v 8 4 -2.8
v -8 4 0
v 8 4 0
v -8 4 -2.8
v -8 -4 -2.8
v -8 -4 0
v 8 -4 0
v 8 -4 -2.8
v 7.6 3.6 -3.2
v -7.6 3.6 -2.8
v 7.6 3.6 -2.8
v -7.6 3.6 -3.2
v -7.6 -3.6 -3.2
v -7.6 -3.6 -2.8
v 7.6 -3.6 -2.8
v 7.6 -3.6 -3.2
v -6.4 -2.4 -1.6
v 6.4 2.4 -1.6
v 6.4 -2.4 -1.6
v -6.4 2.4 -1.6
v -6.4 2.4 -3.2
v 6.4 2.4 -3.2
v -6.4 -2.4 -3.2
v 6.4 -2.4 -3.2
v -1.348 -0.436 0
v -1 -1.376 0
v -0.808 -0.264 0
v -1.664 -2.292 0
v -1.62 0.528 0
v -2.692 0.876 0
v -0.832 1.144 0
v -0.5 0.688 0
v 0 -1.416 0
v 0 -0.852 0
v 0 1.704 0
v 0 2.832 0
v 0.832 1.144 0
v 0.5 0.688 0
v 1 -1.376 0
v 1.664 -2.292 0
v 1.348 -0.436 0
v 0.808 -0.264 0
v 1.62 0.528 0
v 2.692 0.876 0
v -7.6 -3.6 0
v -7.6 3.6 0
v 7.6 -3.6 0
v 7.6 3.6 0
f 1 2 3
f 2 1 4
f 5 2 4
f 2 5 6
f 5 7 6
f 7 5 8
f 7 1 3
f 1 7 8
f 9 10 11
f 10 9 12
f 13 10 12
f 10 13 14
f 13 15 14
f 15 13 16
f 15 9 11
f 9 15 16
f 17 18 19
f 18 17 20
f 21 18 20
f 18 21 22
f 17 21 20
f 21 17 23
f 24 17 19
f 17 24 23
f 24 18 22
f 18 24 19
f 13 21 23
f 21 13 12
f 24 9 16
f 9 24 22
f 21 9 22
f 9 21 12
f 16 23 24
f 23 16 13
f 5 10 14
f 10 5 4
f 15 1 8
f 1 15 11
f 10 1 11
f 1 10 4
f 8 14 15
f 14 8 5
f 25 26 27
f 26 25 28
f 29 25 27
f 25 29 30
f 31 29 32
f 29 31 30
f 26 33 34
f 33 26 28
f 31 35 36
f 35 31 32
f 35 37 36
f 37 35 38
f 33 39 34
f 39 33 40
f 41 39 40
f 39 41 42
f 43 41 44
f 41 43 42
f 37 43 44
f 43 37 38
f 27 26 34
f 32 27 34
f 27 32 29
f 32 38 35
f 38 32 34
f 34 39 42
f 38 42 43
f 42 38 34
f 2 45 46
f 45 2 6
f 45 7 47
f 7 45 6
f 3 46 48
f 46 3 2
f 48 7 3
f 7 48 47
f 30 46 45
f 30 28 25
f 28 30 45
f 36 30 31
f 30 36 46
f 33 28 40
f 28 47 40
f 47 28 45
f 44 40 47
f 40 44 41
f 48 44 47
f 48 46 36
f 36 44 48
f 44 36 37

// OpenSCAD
// file: ../p/box5.scad
use <../lib.scad>
function ldraw_lib__box5() = [
// 0 Box with 5 Faces and All Edges
// 0 Name: box5.dat
// 0 Author: James Jessiman
// 0 !LDRAW_ORG Primitive UPDATE 2012-01
// 0 !LICENSE Licensed under CC BY 4.0 : see CAreadme.txt
// 
// 0 BFC CERTIFY CCW
  [0,"BFC","CERTIFY"],
  [0,"BFC","CCW"],
// 
// 0 !HISTORY 2002-04-03 [sbliss] Modified for BFC compliance
// 0 !HISTORY 2002-04-25 [PTadmin] Official Update 2002-02
// 0 !HISTORY 2007-06-24 [PTadmin] Header formatted for Contributor Agreement
// 0 !HISTORY 2008-07-01 [PTadmin] Official Update 2008-01
// 0 !HISTORY 2012-02-16 [Philo] Changed to CCW
// 0 !HISTORY 2012-03-30 [PTadmin] Official Update 2012-01
// 
// 
// 2 24 1 1 1 -1 1 1
  [2,24,1,1,1,-1,1,1],
// 2 24 -1 1 1 -1 1 -1
  [2,24,-1,1,1,-1,1,-1],
// 2 24 -1 1 -1 1 1 -1
  [2,24,-1,1,-1,1,1,-1],
// 2 24 1 1 -1 1 1 1
  [2,24,1,1,-1,1,1,1],
// 2 24 1 0 1 -1 0 1
  [2,24,1,0,1,-1,0,1],
// 2 24 -1 0 1 -1 0 -1
  [2,24,-1,0,1,-1,0,-1],
// 2 24 -1 0 -1 1 0 -1
  [2,24,-1,0,-1,1,0,-1],
// 2 24 1 0 -1 1 0 1
  [2,24,1,0,-1,1,0,1],
// 2 24 1 0 1 1 1 1
  [2,24,1,0,1,1,1,1],
// 2 24 -1 0 1 -1 1 1
  [2,24,-1,0,1,-1,1,1],
// 2 24 1 0 -1 1 1 -1
  [2,24,1,0,-1,1,1,-1],
// 2 24 -1 0 -1 -1 1 -1
  [2,24,-1,0,-1,-1,1,-1],
// 4 16 -1 1 1 1 1 1 1 1 -1 -1 1 -1
  [4,16,-1,1,1,1,1,1,1,1,-1,-1,1,-1],
// 4 16 -1 1 1 -1 0 1 1 0 1 1 1 1
  [4,16,-1,1,1,-1,0,1,1,0,1,1,1,1],
// 4 16 -1 1 -1 -1 0 -1 -1 0 1 -1 1 1
  [4,16,-1,1,-1,-1,0,-1,-1,0,1,-1,1,1],
// 4 16 1 1 -1 1 0 -1 -1 0 -1 -1 1 -1
  [4,16,1,1,-1,1,0,-1,-1,0,-1,-1,1,-1],
// 4 16 1 1 1 1 0 1 1 0 -1 1 1 -1
  [4,16,1,1,1,1,0,1,1,0,-1,1,1,-1],
];
module ldraw_lib__box5(step=0, col=false, unit=2/5, alt=false, line=0.2, solid=!$preview)
    makepoly(ldraw_lib__box5(), step=step, col=col, unit=unit, alt=alt, line=line, solid=solid);
ldraw_lib__box5(line=0.2);
// file: ../p/box4.scad
use <../lib.scad>
function ldraw_lib__box4() = [
// 0 Box with 4 Faces (2 Parallel Pairs) and All Edges
// 0 Name: box4.dat
// 0 Author: James Jessiman
// 0 !LDRAW_ORG Primitive UPDATE 2012-01
// 0 !LICENSE Licensed under CC BY 4.0 : see CAreadme.txt
// 
// 0 BFC CERTIFY CCW
  [0,"BFC","CERTIFY"],
  [0,"BFC","CCW"],
// 
// 0 !HISTORY 2002-04-03 [sbliss] Modified for BFC compliance
// 0 !HISTORY 2002-04-25 [PTadmin] Official Update 2002-02
// 0 !HISTORY 2007-06-24 [PTadmin] Header formatted for Contributor Agreement
// 0 !HISTORY 2008-07-01 [PTadmin] Official Update 2008-01
// 0 !HISTORY 2012-02-16 [Philo] Changed to CCW
// 0 !HISTORY 2012-03-30 [PTadmin] Official Update 2012-01
// 
// 
// 2 24 1 1 1 -1 1 1
  [2,24,1,1,1,-1,1,1],
// 2 24 -1 1 1 -1 1 -1
  [2,24,-1,1,1,-1,1,-1],
// 2 24 -1 1 -1 1 1 -1
  [2,24,-1,1,-1,1,1,-1],
// 2 24 1 1 -1 1 1 1
  [2,24,1,1,-1,1,1,1],
// 2 24 1 0 1 -1 0 1
  [2,24,1,0,1,-1,0,1],
// 2 24 -1 0 1 -1 0 -1
  [2,24,-1,0,1,-1,0,-1],
// 2 24 -1 0 -1 1 0 -1
  [2,24,-1,0,-1,1,0,-1],
// 2 24 1 0 -1 1 0 1
  [2,24,1,0,-1,1,0,1],
// 2 24 1 0 1 1 1 1
  [2,24,1,0,1,1,1,1],
// 2 24 -1 0 1 -1 1 1
  [2,24,-1,0,1,-1,1,1],
// 2 24 1 0 -1 1 1 -1
  [2,24,1,0,-1,1,1,-1],
// 2 24 -1 0 -1 -1 1 -1
  [2,24,-1,0,-1,-1,1,-1],
// 4 16 -1 1 1 -1 0 1 1 0 1 1 1 1
  [4,16,-1,1,1,-1,0,1,1,0,1,1,1,1],
// 4 16 -1 1 -1 -1 0 -1 -1 0 1 -1 1 1
  [4,16,-1,1,-1,-1,0,-1,-1,0,1,-1,1,1],
// 4 16 1 1 -1 1 0 -1 -1 0 -1 -1 1 -1
  [4,16,1,1,-1,1,0,-1,-1,0,-1,-1,1,-1],
// 4 16 1 1 1 1 0 1 1 0 -1 1 1 -1
  [4,16,1,1,1,1,0,1,1,0,-1,1,1,-1],
];
module ldraw_lib__box4(step=0, col=false, unit=2/5, alt=false, line=0.2, solid=!$preview)
    makepoly(ldraw_lib__box4(), step=step, col=col, unit=unit, alt=alt, line=line, solid=solid);
ldraw_lib__box4(line=0.2);
// file: s/3069bs01.scad
use <../../lib.scad>
use <../../p/box4.scad>
use <../../p/box5.scad>
function ldraw_lib__s__3069bs01() = [
// 0 ~Tile  1 x  2 with Groove without Top Face
// 0 Name: s\3069bs01.dat
// 0 Author: Santeri Piippo [arezey]
// 0 !LDRAW_ORG Subpart UPDATE 2010-02
// 0 !LICENSE Licensed under CC BY 4.0 : see CAreadme.txt
// 
// 0 BFC CERTIFY CCW
  [0,"BFC","CERTIFY"],
  [0,"BFC","CCW"],
// 
// 0 !HISTORY 2010-07-05 [PTadmin] Official Update 2010-02
// 
// 
// 1 16 0 0 0 20 0 0 0 7 0 0 0 10 box4.dat
  [1,16,0,0,0,20,0,0,0,7,0,0,0,10, ldraw_lib__box4()],
// 1 16 0 7 0 19 0 0 0 1 0 0 0 9 box4.dat
  [1,16,0,7,0,19,0,0,0,1,0,0,0,9, ldraw_lib__box4()],
// 0 BFC INVERTNEXT
  [0,"BFC","INVERTNEXT"],
// 1 16 0 8 0 16 0 0 0 -4 0 0 0 6 box5.dat
  [1,16,0,8,0,16,0,0,0,-4,0,0,0,6, ldraw_lib__box5()],
// 4 16 -19 8 9 -16 8 6 -16 8 -6 -19 8 -9
  [4,16,-19,8,9,-16,8,6,-16,8,-6,-19,8,-9],
// 4 16 19 8 -9 16 8 -6 16 8 6 19 8 9
  [4,16,19,8,-9,16,8,-6,16,8,6,19,8,9],
// 4 16 19 8 9 16 8 6 -16 8 6 -19 8 9
  [4,16,19,8,9,16,8,6,-16,8,6,-19,8,9],
// 4 16 -19 8 -9 -16 8 -6 16 8 -6 19 8 -9
  [4,16,-19,8,-9,-16,8,-6,16,8,-6,19,8,-9],
// 4 16 -20 7 10 -19 7 9 -19 7 -9 -20 7 -10
  [4,16,-20,7,10,-19,7,9,-19,7,-9,-20,7,-10],
// 4 16 20 7 -10 19 7 -9 19 7 9 20 7 10
  [4,16,20,7,-10,19,7,-9,19,7,9,20,7,10],
// 4 16 20 7 10 19 7 9 -19 7 9 -20 7 10
  [4,16,20,7,10,19,7,9,-19,7,9,-20,7,10],
// 4 16 -20 7 -10 -19 7 -9 19 7 -9 20 7 -10
  [4,16,-20,7,-10,-19,7,-9,19,7,-9,20,7,-10],
// 0 //
];
module ldraw_lib__s__3069bs01(step=0, col=false, unit=2/5, alt=false, line=0.2, solid=!$preview)
    makepoly(ldraw_lib__s__3069bs01(), step=step, col=col, unit=unit, alt=alt, line=line, solid=solid);
ldraw_lib__s__3069bs01(line=0.2);
// main file
use <../lib.scad>
use <s/3069bs01.scad>
function ldraw_lib__3069bpz3() = [
// 0 Tile  1 x  2 with Red Star with Black Border on Metallic Silver Background Pattern
// 0 Name: 3069bpz3.dat
// 0 Author: Damien Roux [Darats]
// 0 !LDRAW_ORG Part UPDATE 2018-02
// 0 !LICENSE Licensed under CC BY 4.0 : see CAreadme.txt
// 
// 0 BFC CERTIFY CCW
  [0,"BFC","CERTIFY"],
  [0,"BFC","CCW"],
// 
// 0 !KEYWORDS Brickheadz, BrickLink 3069bpb580, Set 41490, wonder woman
// 
// 0 !HISTORY 2018-12-08 [PTadmin] Official Update 2018-02
// 
// 
// 1 16 0 0 0 1 0 0 0 1 0 0 0 1 s\3069bs01.dat
  [1,16,0,0,0,1,0,0,0,1,0,0,0,1, ldraw_lib__s__3069bs01()],
// 4 0 -2.5 0 -3.44 -2.02 0 -0.66 -3.37 0 -1.09 -4.16 0 -5.73
  [4,0,-2.5,0,-3.44,-2.02,0,-0.66,-3.37,0,-1.09,-4.16,0,-5.73],
// 4 0 -4.05 0 1.32 -6.73 0 2.19 -3.37 0 -1.09 -2.02 0 -0.66
  [4,0,-4.05,0,1.32,-6.73,0,2.19,-3.37,0,-1.09,-2.02,0,-0.66],
// 4 0 -2.08 0 2.86 -6.73 0 2.19 -4.05 0 1.32 -1.25 0 1.72
  [4,0,-2.08,0,2.86,-6.73,0,2.19,-4.05,0,1.32,-1.25,0,1.72],
// 4 0 -2.5 0 -3.44 -4.16 0 -5.73 0 0 -3.54 0 0 -2.13
  [4,0,-2.5,0,-3.44,-4.16,0,-5.73,0,0,-3.54,0,0,-2.13],
// 4 0 0 0 4.26 0 0 7.08 -2.08 0 2.86 -1.25 0 1.72
  [4,0,0,0,4.26,0,0,7.08,-2.08,0,2.86,-1.25,0,1.72],
// 4 0 0 0 4.26 1.25 0 1.72 2.08 0 2.86 0 0 7.08
  [4,0,0,0,4.26,1.25,0,1.72,2.08,0,2.86,0,0,7.08],
// 4 0 2.5 0 -3.44 0 0 -2.13 0 0 -3.54 4.16 0 -5.73
  [4,0,2.5,0,-3.44,0,0,-2.13,0,0,-3.54,4.16,0,-5.73],
// 4 0 2.5 0 -3.44 4.16 0 -5.73 3.37 0 -1.09 2.02 0 -0.66
  [4,0,2.5,0,-3.44,4.16,0,-5.73,3.37,0,-1.09,2.02,0,-0.66],
// 4 0 4.05 0 1.32 2.02 0 -0.66 3.37 0 -1.09 6.73 0 2.19
  [4,0,4.05,0,1.32,2.02,0,-0.66,3.37,0,-1.09,6.73,0,2.19],
// 4 0 4.05 0 1.32 6.73 0 2.19 2.08 0 2.86 1.25 0 1.72
  [4,0,4.05,0,1.32,6.73,0,2.19,2.08,0,2.86,1.25,0,1.72],
// 3 4 -2.02 0 -0.66 -2.5 0 -3.44 0 0 -2.13
  [3,4,-2.02,0,-0.66,-2.5,0,-3.44,0,0,-2.13],
// 4 4 0 0 -2.13 -1.25 0 1.72 -4.05 0 1.32 -2.02 0 -0.66
  [4,4,0,0,-2.13,-1.25,0,1.72,-4.05,0,1.32,-2.02,0,-0.66],
// 4 4 0 0 -2.13 1.25 0 1.72 0 0 4.26 -1.25 0 1.72
  [4,4,0,0,-2.13,1.25,0,1.72,0,0,4.26,-1.25,0,1.72],
// 3 4 0 0 -2.13 2.5 0 -3.44 2.02 0 -0.66
  [3,4,0,0,-2.13,2.5,0,-3.44,2.02,0,-0.66],
// 4 4 1.25 0 1.72 0 0 -2.13 2.02 0 -0.66 4.05 0 1.32
  [4,4,1.25,0,1.72,0,0,-2.13,2.02,0,-0.66,4.05,0,1.32],
// 4 16 -19 0 -9 -19 0 9 -20 0 10 -20 0 -10
  [4,16,-19,0,-9,-19,0,9,-20,0,10,-20,0,-10],
// 4 16 19 0 -9 -19 0 -9 -20 0 -10 20 0 -10
  [4,16,19,0,-9,-19,0,-9,-20,0,-10,20,0,-10],
// 4 16 -19 0 9 19 0 9 20 0 10 -20 0 10
  [4,16,-19,0,9,19,0,9,20,0,10,-20,0,10],
// 4 16 19 0 9 19 0 -9 20 0 -10 20 0 10
  [4,16,19,0,9,19,0,-9,20,0,-10,20,0,10],
// 3 80 -6.73 0 2.19 -19 0 9 -19 0 -9
  [3,80,-6.73,0,2.19,-19,0,9,-19,0,-9],
// 4 80 -19 0 -9 -4.16 0 -5.73 -3.37 0 -1.09 -6.73 0 2.19
  [4,80,-19,0,-9,-4.16,0,-5.73,-3.37,0,-1.09,-6.73,0,2.19],
// 4 80 -6.73 0 2.19 -2.08 0 2.86 0 0 7.08 -19 0 9
  [4,80,-6.73,0,2.19,-2.08,0,2.86,0,0,7.08,-19,0,9],
// 3 80 0 0 -3.54 -4.16 0 -5.73 4.16 0 -5.73
  [3,80,0,0,-3.54,-4.16,0,-5.73,4.16,0,-5.73],
// 4 80 4.16 0 -5.73 -4.16 0 -5.73 -19 0 -9 19 0 -9
  [4,80,4.16,0,-5.73,-4.16,0,-5.73,-19,0,-9,19,0,-9],
// 4 80 6.73 0 2.19 3.37 0 -1.09 4.16 0 -5.73 19 0 -9
  [4,80,6.73,0,2.19,3.37,0,-1.09,4.16,0,-5.73,19,0,-9],
// 3 80 19 0 9 6.73 0 2.19 19 0 -9
  [3,80,19,0,9,6.73,0,2.19,19,0,-9],
// 3 80 19 0 9 -19 0 9 0 0 7.08
  [3,80,19,0,9,-19,0,9,0,0,7.08],
// 4 80 6.73 0 2.19 19 0 9 0 0 7.08 2.08 0 2.86
  [4,80,6.73,0,2.19,19,0,9,0,0,7.08,2.08,0,2.86],
];
module ldraw_lib__3069bpz3(step=0, col=false, unit=2/5, alt=false, line=0.2, solid=!$preview)
    makepoly(ldraw_lib__3069bpz3(), step=step, col=col, unit=unit, alt=alt, line=line, solid=solid);
ldraw_lib__3069bpz3(line=0.2);
